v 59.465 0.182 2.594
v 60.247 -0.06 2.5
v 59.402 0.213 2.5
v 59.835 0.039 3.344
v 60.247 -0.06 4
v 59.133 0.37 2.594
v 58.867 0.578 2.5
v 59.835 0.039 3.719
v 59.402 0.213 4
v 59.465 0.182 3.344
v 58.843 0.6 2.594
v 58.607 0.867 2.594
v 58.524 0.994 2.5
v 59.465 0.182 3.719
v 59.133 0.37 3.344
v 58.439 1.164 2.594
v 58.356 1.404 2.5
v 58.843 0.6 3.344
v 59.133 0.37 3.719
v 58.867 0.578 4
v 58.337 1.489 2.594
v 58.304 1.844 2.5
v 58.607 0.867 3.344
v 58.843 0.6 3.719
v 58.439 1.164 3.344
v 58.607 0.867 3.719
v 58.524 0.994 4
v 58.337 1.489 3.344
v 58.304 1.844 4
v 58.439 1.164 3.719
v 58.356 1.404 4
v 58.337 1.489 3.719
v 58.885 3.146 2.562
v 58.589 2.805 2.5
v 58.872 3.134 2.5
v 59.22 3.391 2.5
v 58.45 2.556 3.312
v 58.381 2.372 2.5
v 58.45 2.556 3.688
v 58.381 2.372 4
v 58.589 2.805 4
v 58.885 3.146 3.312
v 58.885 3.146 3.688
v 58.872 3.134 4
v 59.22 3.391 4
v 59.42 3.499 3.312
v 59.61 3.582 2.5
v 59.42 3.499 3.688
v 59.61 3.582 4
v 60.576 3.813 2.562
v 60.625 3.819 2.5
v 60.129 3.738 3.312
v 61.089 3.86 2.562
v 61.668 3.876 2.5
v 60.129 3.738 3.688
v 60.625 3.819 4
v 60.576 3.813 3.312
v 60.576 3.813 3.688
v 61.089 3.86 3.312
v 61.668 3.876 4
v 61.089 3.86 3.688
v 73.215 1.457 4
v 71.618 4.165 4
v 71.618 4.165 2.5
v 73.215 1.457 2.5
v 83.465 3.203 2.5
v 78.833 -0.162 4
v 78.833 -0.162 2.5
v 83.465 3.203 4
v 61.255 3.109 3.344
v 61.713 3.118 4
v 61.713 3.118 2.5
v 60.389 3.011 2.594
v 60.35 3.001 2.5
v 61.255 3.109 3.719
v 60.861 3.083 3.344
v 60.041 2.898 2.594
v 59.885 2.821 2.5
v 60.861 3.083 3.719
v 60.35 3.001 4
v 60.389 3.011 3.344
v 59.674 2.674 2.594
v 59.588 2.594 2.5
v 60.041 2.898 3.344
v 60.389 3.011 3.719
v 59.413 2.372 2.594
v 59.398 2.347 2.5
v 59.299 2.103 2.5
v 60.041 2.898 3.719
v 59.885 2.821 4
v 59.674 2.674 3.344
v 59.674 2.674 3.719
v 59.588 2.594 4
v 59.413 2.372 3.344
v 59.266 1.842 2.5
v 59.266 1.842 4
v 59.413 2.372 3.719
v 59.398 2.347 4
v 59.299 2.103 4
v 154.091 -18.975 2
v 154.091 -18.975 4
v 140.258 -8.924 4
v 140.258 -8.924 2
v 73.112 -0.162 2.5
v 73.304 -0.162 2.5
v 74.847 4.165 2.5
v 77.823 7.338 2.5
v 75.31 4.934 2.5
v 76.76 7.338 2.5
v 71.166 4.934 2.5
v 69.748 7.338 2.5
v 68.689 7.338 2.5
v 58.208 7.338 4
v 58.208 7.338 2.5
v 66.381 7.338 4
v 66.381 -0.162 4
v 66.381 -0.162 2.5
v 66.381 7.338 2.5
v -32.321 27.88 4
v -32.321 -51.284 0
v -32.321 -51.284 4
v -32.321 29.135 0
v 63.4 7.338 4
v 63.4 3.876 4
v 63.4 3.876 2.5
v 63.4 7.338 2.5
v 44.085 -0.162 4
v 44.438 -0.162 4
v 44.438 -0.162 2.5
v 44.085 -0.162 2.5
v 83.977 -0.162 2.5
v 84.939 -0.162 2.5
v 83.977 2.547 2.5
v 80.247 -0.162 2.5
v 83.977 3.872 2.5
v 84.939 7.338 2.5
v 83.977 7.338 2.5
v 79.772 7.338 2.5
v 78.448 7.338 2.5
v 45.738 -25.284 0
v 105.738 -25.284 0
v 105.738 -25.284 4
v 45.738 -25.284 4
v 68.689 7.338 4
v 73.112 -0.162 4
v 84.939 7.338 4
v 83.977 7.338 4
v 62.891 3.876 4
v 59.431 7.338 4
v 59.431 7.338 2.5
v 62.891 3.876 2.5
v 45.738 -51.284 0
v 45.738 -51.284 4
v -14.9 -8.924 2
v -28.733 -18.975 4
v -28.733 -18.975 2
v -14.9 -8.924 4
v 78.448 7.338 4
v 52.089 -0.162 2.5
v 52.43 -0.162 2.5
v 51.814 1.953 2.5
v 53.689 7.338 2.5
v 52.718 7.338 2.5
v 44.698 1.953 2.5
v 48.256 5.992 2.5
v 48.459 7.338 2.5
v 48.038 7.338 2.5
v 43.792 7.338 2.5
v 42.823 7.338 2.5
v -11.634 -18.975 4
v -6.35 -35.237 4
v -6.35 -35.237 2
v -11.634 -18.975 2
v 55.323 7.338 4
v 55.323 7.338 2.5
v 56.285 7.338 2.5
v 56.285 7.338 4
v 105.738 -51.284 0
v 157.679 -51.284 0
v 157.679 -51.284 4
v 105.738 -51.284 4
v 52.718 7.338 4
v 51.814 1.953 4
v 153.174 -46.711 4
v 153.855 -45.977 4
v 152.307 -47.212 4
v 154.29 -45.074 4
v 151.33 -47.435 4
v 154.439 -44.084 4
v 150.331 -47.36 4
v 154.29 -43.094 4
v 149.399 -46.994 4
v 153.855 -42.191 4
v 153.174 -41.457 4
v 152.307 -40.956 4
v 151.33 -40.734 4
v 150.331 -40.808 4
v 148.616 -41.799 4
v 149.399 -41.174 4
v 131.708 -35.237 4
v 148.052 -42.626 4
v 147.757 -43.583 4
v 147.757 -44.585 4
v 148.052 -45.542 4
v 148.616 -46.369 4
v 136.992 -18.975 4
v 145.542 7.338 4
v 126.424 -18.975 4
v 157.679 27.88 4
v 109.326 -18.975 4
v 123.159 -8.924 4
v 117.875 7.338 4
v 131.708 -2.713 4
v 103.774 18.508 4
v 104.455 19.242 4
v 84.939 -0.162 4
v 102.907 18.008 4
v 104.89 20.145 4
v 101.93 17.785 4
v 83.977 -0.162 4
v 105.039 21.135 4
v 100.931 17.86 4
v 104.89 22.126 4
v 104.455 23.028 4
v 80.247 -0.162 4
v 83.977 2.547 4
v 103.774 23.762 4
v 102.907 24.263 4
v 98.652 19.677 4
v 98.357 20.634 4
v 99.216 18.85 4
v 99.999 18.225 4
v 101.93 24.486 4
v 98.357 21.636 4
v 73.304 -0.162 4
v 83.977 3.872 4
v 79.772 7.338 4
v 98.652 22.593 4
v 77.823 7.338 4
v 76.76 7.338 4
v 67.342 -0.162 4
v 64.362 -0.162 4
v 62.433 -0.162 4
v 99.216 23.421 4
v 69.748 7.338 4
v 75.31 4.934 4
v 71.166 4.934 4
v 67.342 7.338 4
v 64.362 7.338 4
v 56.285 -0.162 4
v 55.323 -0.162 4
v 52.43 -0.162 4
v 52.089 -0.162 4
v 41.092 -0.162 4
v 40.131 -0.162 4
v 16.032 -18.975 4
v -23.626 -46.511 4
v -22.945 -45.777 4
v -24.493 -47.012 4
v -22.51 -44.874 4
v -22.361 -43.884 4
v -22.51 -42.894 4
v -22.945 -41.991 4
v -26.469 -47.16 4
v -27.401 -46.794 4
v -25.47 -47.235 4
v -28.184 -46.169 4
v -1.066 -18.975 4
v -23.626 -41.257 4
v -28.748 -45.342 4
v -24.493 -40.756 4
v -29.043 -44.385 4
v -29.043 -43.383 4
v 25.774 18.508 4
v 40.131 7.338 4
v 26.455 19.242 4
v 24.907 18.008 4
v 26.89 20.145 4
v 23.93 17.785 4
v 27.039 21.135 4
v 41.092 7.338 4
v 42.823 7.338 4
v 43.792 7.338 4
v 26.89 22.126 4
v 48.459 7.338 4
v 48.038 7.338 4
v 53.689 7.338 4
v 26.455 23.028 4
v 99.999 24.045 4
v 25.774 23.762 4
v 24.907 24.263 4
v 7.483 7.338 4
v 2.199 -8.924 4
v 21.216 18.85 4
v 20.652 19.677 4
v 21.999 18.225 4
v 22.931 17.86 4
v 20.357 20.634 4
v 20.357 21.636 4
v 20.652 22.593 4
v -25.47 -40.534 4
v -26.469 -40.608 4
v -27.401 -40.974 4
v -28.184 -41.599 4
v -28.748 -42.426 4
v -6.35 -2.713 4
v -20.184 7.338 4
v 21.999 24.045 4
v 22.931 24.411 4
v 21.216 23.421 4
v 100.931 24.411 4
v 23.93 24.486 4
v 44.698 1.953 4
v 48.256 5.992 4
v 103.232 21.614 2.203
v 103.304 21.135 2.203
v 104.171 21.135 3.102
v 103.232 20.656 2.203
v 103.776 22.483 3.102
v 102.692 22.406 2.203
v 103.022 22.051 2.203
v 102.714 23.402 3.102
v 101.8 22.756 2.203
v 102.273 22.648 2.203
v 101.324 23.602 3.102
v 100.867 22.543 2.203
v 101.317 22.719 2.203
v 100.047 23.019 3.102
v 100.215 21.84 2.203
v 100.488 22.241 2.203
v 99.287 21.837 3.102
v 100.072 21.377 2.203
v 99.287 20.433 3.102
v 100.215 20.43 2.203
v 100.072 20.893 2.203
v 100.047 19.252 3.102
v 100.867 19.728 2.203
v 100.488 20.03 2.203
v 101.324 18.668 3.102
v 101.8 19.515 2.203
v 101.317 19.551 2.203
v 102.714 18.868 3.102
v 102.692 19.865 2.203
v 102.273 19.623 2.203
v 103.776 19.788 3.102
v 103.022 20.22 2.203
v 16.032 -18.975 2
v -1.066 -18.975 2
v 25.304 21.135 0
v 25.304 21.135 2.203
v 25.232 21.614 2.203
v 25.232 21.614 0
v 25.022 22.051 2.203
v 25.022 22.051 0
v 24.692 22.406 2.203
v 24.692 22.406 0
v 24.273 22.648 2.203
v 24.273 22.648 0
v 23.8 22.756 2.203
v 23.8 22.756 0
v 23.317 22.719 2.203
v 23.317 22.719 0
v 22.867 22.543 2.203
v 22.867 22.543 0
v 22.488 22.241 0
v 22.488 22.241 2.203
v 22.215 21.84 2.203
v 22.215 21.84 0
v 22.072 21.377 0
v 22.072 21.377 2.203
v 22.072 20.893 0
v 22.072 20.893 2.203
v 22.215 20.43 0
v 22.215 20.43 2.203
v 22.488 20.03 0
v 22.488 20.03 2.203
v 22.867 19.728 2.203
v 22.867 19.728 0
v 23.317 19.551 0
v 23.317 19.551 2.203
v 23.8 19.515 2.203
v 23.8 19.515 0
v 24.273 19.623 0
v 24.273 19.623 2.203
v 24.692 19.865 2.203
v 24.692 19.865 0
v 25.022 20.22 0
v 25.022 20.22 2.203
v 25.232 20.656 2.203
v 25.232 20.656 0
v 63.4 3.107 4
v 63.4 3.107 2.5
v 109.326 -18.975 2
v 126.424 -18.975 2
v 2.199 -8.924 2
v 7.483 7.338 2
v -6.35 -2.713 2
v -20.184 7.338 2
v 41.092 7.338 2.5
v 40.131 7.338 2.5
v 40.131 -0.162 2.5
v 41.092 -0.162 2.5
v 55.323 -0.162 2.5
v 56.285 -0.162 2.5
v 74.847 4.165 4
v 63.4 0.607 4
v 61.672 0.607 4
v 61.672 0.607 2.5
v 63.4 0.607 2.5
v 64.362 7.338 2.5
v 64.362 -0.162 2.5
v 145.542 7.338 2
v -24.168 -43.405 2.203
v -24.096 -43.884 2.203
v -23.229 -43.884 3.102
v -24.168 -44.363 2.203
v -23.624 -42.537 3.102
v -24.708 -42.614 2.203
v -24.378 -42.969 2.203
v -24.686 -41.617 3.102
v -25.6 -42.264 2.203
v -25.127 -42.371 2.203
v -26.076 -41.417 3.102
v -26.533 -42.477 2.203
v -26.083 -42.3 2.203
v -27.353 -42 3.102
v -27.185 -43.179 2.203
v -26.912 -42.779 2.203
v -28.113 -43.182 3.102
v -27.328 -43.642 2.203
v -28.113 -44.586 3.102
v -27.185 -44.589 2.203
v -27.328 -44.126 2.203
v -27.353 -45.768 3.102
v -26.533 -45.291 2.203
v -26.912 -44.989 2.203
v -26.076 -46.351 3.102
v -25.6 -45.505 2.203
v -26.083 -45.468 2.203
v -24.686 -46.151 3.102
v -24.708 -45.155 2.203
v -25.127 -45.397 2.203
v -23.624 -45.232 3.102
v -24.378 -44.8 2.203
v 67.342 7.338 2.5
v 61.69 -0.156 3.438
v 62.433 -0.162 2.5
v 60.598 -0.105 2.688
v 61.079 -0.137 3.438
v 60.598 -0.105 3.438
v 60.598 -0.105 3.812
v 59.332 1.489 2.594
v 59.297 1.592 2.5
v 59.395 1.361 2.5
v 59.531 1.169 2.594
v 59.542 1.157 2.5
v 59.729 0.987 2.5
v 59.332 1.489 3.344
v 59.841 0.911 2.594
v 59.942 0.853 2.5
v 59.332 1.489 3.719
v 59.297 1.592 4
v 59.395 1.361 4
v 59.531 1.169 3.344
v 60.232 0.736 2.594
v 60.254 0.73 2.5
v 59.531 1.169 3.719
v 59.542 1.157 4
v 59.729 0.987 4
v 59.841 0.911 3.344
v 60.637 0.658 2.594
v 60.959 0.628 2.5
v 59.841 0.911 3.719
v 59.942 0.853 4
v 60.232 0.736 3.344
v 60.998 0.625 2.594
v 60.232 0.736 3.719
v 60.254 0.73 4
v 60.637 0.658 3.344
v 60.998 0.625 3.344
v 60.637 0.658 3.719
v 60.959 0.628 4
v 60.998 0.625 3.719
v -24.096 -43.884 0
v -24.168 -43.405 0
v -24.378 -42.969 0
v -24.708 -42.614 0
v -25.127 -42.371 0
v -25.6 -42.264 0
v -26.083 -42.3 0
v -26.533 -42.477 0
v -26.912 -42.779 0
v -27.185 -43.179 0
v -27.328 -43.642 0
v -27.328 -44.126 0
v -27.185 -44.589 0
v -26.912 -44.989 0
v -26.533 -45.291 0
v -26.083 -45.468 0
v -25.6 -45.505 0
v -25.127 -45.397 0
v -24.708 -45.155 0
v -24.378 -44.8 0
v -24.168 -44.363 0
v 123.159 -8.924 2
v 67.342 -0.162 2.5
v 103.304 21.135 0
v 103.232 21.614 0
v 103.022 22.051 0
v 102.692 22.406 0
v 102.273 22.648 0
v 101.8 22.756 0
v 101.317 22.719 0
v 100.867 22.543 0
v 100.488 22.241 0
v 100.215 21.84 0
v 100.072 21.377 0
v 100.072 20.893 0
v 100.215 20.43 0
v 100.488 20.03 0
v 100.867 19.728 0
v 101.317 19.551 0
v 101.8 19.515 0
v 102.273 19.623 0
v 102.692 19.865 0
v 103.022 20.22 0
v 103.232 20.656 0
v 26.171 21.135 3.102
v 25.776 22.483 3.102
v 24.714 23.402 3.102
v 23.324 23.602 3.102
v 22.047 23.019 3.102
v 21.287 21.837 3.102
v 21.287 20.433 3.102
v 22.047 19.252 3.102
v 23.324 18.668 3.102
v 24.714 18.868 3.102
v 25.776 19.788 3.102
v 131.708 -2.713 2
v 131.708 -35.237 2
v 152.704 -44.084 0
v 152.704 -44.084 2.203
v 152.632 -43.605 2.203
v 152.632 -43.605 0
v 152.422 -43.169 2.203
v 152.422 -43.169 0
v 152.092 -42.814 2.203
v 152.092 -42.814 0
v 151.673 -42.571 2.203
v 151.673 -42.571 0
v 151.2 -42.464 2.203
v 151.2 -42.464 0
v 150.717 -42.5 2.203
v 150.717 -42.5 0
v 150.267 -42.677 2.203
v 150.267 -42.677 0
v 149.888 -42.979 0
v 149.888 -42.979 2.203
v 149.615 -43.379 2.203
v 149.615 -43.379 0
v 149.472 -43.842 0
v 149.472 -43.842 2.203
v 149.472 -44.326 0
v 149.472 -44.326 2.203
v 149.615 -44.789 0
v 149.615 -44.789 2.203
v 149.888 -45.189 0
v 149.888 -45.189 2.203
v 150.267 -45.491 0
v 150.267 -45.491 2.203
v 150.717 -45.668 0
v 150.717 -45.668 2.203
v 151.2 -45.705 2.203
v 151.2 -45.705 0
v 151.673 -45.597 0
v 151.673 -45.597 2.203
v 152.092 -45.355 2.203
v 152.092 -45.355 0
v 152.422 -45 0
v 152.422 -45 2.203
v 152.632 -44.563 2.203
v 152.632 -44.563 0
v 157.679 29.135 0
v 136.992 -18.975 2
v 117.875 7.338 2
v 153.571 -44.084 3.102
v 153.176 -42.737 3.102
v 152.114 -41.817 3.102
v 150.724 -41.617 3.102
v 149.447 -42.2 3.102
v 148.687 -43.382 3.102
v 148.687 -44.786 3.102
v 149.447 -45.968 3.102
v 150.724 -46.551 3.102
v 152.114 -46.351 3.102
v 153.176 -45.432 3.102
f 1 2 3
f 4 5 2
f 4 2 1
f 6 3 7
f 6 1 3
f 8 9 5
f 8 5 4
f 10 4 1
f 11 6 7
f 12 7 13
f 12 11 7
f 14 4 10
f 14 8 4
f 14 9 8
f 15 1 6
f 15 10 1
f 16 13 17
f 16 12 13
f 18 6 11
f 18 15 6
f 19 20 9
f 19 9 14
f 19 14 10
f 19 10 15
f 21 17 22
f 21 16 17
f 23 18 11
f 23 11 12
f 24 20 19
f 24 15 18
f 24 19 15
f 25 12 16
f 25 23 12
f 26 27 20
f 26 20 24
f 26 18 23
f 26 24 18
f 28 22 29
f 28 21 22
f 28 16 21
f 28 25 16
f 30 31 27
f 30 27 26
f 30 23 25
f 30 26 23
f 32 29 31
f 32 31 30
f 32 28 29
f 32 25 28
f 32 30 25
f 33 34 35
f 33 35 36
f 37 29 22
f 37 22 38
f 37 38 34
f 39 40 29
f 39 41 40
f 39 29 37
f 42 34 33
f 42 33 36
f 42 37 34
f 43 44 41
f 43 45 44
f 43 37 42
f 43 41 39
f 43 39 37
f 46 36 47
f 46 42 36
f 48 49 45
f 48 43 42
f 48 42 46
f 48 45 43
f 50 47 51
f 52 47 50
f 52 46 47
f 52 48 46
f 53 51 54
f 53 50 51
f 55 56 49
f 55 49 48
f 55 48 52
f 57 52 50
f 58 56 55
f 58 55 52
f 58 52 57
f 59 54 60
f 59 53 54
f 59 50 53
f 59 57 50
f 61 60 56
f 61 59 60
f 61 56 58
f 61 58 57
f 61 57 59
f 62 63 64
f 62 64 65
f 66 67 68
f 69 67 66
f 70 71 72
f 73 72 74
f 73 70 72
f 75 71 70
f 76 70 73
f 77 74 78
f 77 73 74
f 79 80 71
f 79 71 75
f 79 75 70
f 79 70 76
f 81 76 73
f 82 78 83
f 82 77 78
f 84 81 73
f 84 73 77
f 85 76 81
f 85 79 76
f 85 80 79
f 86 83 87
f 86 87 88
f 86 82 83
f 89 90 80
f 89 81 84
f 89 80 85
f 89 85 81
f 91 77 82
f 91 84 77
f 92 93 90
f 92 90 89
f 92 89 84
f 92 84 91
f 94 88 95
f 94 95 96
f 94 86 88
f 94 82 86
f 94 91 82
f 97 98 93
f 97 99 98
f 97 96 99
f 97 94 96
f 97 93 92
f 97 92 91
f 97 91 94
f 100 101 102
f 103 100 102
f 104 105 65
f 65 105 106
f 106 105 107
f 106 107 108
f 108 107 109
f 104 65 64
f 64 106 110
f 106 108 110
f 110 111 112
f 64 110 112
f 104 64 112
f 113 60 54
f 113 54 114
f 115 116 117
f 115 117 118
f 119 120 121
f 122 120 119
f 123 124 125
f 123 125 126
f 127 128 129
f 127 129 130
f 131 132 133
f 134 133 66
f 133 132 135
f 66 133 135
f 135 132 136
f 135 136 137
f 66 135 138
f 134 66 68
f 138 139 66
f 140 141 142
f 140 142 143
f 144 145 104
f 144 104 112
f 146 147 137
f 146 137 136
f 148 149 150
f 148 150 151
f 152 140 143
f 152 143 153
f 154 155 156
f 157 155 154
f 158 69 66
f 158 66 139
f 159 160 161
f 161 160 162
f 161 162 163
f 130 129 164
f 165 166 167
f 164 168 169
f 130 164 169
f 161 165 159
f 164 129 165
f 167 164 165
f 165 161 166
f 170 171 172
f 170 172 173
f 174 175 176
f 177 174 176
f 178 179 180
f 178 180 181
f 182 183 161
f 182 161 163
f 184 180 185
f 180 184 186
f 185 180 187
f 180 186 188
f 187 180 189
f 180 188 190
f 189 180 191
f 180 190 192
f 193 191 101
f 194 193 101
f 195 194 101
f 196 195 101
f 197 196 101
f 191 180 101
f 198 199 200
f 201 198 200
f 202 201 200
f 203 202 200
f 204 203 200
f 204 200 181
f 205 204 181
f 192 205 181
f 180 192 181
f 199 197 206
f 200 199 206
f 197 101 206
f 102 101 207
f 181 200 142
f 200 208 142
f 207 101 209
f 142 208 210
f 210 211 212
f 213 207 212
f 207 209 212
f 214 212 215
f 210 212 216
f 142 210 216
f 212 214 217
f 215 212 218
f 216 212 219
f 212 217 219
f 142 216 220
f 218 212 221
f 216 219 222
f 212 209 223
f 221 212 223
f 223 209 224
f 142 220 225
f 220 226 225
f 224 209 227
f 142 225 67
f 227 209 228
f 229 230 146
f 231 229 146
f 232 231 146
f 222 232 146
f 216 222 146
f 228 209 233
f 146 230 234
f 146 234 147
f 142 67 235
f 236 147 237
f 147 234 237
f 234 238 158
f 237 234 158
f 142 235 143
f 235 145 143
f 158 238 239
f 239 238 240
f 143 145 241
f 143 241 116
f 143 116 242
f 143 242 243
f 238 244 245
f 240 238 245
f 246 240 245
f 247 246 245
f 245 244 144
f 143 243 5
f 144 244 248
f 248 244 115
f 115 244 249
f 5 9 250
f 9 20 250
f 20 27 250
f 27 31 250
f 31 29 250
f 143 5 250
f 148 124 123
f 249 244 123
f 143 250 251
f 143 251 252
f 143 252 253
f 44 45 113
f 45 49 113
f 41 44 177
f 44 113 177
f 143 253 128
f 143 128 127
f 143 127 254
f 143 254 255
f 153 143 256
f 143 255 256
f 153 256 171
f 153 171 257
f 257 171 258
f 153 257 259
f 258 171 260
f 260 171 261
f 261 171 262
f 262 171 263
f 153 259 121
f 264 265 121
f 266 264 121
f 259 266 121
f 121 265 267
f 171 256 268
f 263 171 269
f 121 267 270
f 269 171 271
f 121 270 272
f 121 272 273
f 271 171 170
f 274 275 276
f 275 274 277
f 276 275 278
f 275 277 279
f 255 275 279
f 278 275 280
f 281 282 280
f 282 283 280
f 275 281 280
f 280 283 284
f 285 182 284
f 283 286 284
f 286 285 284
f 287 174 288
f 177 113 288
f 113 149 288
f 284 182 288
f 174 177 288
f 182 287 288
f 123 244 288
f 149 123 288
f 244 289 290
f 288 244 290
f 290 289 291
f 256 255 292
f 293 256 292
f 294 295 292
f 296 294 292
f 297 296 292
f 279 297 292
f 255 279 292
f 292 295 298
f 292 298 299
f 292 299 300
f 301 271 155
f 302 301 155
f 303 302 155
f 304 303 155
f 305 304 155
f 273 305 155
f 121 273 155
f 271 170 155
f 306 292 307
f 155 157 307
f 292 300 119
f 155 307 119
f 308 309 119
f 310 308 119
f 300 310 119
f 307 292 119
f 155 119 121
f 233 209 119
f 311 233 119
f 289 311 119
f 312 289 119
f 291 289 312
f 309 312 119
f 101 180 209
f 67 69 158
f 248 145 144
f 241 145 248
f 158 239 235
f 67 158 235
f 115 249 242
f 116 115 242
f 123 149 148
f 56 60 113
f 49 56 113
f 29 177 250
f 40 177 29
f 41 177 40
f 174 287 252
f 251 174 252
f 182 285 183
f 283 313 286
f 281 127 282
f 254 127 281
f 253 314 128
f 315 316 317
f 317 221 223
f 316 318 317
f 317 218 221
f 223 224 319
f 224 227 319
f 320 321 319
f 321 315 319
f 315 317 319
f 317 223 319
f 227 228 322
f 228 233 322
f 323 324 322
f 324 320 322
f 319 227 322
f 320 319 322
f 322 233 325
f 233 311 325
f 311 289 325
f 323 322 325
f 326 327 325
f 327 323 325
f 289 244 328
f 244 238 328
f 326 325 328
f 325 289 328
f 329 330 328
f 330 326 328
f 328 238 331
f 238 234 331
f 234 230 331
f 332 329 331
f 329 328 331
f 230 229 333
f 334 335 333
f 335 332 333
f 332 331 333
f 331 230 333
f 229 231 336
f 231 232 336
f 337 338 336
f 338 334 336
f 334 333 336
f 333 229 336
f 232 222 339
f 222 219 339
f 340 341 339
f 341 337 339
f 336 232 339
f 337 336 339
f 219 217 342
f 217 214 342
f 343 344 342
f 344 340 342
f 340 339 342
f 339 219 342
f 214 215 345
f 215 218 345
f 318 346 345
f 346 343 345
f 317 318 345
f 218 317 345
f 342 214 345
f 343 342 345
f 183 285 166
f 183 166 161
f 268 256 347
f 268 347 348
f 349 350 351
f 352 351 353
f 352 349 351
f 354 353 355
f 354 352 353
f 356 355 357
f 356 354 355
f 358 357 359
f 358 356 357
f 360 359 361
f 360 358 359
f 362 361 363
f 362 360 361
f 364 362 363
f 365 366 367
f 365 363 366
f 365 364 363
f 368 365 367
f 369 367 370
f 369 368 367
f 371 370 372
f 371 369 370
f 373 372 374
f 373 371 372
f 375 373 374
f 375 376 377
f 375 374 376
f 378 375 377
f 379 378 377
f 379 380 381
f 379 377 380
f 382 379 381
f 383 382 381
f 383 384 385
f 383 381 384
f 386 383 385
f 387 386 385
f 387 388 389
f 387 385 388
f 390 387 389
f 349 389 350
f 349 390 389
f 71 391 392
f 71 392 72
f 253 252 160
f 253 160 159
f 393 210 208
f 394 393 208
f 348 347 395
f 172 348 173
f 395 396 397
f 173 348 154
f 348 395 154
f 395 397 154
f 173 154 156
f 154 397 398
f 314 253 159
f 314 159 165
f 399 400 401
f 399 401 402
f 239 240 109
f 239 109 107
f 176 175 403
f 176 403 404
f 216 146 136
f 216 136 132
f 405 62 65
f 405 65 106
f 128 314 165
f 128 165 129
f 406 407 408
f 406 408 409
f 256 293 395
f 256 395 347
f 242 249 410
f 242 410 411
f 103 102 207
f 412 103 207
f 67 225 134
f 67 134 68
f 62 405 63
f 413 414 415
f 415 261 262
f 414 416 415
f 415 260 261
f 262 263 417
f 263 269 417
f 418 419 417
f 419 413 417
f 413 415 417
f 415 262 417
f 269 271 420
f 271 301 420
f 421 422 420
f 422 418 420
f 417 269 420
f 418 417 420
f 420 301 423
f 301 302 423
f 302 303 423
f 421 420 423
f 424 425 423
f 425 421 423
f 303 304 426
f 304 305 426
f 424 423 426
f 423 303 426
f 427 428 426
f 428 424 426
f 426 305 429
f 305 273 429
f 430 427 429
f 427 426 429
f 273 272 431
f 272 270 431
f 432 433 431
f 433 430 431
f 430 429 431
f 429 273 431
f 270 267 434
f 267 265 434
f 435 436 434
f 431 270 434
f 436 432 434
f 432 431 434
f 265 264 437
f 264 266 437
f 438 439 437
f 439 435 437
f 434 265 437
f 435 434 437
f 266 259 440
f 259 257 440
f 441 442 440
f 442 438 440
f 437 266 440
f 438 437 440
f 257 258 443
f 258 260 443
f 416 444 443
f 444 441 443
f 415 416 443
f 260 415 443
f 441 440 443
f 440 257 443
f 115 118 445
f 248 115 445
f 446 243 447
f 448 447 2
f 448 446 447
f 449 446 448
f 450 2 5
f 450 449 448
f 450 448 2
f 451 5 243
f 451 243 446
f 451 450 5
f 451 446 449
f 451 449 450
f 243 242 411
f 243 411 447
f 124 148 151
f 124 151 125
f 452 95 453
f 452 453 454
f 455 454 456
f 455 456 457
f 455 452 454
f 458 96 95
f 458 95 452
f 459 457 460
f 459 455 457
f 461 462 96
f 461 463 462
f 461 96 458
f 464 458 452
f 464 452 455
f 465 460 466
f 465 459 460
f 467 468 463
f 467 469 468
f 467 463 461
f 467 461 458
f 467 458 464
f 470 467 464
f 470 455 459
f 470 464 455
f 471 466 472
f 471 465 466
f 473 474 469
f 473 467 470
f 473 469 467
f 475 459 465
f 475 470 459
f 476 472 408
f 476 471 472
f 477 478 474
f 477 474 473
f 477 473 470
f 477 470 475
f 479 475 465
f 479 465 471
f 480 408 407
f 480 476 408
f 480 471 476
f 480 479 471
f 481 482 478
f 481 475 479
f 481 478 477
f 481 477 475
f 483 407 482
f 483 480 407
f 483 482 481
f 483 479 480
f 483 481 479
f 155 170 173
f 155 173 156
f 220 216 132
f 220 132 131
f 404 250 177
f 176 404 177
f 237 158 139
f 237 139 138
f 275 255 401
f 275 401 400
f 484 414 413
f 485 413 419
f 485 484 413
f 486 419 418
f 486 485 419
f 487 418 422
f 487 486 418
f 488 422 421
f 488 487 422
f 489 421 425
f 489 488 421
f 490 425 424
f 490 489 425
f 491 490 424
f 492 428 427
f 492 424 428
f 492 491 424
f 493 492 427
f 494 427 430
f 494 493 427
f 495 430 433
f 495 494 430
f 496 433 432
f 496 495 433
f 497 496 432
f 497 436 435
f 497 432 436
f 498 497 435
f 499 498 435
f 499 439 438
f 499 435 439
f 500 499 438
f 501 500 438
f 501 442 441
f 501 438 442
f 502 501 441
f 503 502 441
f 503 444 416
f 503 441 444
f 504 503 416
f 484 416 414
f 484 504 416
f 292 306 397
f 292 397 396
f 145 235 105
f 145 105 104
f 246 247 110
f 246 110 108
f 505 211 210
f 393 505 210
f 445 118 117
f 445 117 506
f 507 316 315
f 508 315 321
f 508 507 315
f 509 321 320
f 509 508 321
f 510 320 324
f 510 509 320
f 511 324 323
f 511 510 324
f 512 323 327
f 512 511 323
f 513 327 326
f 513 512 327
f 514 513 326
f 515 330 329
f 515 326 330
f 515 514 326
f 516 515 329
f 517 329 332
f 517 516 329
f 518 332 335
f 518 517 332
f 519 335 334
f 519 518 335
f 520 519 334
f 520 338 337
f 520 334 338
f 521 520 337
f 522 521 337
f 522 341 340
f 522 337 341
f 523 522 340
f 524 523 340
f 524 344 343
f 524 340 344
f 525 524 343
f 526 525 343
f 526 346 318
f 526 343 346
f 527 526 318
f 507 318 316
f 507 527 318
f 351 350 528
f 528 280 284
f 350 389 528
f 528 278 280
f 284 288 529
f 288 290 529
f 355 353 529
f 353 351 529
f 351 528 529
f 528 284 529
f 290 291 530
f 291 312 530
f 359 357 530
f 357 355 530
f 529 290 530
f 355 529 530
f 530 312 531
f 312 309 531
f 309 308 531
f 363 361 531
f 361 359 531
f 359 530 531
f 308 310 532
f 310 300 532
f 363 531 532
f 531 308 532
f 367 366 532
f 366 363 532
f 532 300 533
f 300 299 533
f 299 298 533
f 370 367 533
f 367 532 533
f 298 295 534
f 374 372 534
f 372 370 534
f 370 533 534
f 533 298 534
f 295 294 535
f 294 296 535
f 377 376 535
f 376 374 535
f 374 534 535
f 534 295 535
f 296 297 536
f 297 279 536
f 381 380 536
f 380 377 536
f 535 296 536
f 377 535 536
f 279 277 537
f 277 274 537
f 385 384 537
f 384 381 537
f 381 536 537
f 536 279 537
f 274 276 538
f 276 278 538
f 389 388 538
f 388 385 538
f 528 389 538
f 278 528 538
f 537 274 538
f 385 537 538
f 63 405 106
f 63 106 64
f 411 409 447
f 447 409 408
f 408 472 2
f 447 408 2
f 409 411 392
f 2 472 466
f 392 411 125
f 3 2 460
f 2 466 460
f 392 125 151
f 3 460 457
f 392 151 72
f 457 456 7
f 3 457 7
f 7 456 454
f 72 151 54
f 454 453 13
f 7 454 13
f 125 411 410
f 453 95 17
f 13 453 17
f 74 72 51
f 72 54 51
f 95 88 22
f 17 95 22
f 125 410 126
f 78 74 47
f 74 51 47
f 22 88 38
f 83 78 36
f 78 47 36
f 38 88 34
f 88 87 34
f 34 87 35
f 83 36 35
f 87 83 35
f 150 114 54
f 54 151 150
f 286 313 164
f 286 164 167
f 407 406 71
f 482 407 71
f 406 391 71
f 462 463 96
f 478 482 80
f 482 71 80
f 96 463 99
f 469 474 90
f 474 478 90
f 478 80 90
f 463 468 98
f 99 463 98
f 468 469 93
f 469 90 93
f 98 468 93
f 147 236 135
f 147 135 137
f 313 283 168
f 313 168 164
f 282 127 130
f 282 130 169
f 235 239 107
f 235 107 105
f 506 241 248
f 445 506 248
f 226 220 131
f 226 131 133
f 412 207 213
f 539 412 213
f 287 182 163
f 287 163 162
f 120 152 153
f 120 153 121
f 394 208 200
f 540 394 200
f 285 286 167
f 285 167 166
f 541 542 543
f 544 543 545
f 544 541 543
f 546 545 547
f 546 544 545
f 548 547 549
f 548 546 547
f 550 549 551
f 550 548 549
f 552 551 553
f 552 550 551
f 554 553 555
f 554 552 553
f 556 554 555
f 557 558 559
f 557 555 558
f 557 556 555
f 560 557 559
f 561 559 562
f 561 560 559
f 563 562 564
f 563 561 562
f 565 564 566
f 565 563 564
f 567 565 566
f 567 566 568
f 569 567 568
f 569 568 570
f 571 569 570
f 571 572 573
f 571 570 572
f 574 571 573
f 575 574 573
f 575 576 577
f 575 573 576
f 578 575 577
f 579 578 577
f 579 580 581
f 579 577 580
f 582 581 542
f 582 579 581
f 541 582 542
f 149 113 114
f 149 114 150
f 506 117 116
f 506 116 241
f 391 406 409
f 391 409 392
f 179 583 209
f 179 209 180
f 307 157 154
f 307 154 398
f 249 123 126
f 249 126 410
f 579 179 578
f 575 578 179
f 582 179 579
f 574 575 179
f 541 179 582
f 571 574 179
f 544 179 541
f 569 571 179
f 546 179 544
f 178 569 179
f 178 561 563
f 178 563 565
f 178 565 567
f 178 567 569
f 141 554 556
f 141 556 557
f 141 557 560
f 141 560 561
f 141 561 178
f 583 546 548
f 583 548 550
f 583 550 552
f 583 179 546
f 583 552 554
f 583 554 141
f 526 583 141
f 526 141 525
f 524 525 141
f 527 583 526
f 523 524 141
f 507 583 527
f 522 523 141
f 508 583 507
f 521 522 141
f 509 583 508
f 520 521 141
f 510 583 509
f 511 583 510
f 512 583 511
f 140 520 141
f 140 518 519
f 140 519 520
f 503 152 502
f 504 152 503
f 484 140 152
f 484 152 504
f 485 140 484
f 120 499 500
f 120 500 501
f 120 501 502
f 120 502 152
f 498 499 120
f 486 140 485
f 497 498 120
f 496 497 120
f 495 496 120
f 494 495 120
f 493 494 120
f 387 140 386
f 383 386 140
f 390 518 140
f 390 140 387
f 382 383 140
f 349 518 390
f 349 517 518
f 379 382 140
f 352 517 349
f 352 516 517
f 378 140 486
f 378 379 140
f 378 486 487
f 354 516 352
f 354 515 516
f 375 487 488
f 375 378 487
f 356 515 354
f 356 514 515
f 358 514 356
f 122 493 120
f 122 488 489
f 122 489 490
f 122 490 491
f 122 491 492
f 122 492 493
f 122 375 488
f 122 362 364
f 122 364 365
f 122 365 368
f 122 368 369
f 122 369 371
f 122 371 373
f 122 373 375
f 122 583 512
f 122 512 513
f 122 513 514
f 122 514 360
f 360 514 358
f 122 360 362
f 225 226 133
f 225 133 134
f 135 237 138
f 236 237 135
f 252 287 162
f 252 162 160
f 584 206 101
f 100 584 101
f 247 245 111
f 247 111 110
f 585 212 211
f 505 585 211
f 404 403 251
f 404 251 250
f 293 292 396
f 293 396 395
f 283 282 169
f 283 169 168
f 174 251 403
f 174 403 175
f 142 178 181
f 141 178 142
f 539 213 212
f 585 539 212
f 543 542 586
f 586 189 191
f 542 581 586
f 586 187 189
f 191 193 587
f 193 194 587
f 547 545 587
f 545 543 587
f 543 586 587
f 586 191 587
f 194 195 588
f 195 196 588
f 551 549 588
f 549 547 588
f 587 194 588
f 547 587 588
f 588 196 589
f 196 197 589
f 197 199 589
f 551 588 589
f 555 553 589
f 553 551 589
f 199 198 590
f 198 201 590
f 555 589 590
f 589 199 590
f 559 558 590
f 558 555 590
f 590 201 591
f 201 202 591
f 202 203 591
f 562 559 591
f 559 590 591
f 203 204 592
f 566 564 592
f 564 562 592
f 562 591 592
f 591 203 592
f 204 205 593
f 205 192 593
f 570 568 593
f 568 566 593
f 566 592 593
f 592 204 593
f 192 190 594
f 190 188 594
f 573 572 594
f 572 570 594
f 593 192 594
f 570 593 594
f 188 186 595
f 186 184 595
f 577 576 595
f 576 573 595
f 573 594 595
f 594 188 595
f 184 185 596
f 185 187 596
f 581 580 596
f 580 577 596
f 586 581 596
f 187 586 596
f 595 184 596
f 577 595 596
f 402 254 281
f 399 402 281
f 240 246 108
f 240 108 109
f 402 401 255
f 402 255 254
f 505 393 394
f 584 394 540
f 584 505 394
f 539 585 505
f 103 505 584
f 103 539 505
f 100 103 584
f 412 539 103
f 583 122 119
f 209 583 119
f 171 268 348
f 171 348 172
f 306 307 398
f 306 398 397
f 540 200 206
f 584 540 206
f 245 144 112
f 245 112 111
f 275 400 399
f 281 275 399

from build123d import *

# Parameters (mm, degrees)
CROQUIS1_R                      = 1.625
SALIENTE_EXTRUIR1_DEPTH         = 4
CORTAR_EXTRUIR1_START           = -190
CORTAR_EXTRUIR1_DEPTH           = 190
CROQUIS4_R                      = 3.35997123
CORTAR_EXTRUIR2_DEPTH           = 1.8
CORTAR_EXTRUIR2_DRAFT           = -44
CORTAR_EXTRUIR2_PROFILE_2_DEPTH = 1.8
CORTAR_EXTRUIR2_PROFILE_2_DRAFT = -44
CORTAR_EXTRUIR2_PROFILE_3_DEPTH = 1.8
CORTAR_EXTRUIR2_PROFILE_3_DRAFT = -44
CORTAR_EXTRUIR2_PROFILE_4_DEPTH = 1.8
CORTAR_EXTRUIR2_PROFILE_4_DRAFT = -44
CORTAR_EXTRUIR3_DEPTH           = 2
CROQUIS9_W                      = 0.961538462
CROQUIS9_H                      = 7.5
CORTAR_EXTRUIR5_DEPTH           = 1.5


with BuildPart() as part:
    # Croquis1 → Saliente-Extruir1 (new body)
    with BuildSketch(Plane.XY):
        Polygon((-32.320991683, -51.284123552), (-32.320991683, 29.135238548), (157.679008317, 29.135238548), (157.679008317, -51.284123552), (105.737585684, -51.284123552), (105.737585684, -25.284123552), (45.737585684, -25.284123552), (45.737585684, -51.284123552), align=None)
        with Locations((23.679008317, 21.135238548)):
            Circle(CROQUIS1_R, mode=Mode.SUBTRACT)
        with Locations((101.679008317, 21.135238548)):
            Circle(CROQUIS1_R, mode=Mode.SUBTRACT)
        with Locations((-25.720991683, -43.884123552)):
            Circle(CROQUIS1_R, mode=Mode.SUBTRACT)
        with Locations((151.079008317, -44.084123552)):
            Circle(CROQUIS1_R, mode=Mode.SUBTRACT)
    extrude(amount=SALIENTE_EXTRUIR1_DEPTH)

    # Croquis3 → Cortar-Extruir1 (cut)
    with BuildSketch(Plane(origin=(157.679008317, 0, 0), x_dir=(0, 0, -1), z_dir=(1, 0, 0)).offset(CORTAR_EXTRUIR1_START)):
        Polygon((-4, 29.135238548), (0, 29.135238548), (-4, 27.880003721), align=None)
    extrude(amount=CORTAR_EXTRUIR1_DEPTH, mode=Mode.SUBTRACT)


with BuildPart() as cortar_extruir2_tool:
    # Croquis4 → Cortar-Extruir2 (with draft: the straight prism first)
    with BuildSketch(Plane.XY.offset(4)):
        with Locations((23.679008317, 21.135238548)):
            Circle(CROQUIS4_R)
    extrude(amount=-CORTAR_EXTRUIR2_DEPTH)
    # Cortar-Extruir2: the draft: its side faces are tilted about the plane it starts from
    cortar_extruir2_sides = [cortar_extruir2_tool.faces().sort_by_distance(p)[0] for p in [
        (20.319037087, 21.135238548, 3.1),
    ]]
    draft(cortar_extruir2_sides, Plane.XY.offset(4), CORTAR_EXTRUIR2_DRAFT)


with BuildPart() as part_1:
    add(part.part)

    # Cortar-Extruir2: cut by cortar_extruir2_tool
    add(cortar_extruir2_tool.part, mode=Mode.SUBTRACT)


with BuildPart() as cortar_extruir2_profile_2_tool:
    # Croquis4 → Cortar-Extruir2 profile 2 (with draft: the straight prism first)
    with BuildSketch(Plane.XY.offset(4)):
        with Locations((101.679008317, 21.135238548)):
            Circle(CROQUIS4_R)
    extrude(amount=-CORTAR_EXTRUIR2_PROFILE_2_DEPTH)
    # Cortar-Extruir2 profile 2: the draft: its side faces are tilted about the plane it starts from
    cortar_extruir2_profile_2_sides = [cortar_extruir2_profile_2_tool.faces().sort_by_distance(p)[0] for p in [
        (98.319037087, 21.135238548, 3.1),
    ]]
    draft(cortar_extruir2_profile_2_sides, Plane.XY.offset(4), CORTAR_EXTRUIR2_PROFILE_2_DRAFT)


with BuildPart() as part_2:
    add(part_1.part)

    # Cortar-Extruir2 profile 2: cut by cortar_extruir2_profile_2_tool
    add(cortar_extruir2_profile_2_tool.part, mode=Mode.SUBTRACT)


with BuildPart() as cortar_extruir2_profile_3_tool:
    # Croquis4 → Cortar-Extruir2 profile 3 (with draft: the straight prism first)
    with BuildSketch(Plane.XY.offset(4)):
        with Locations((-25.720991683, -43.884123552)):
            Circle(CROQUIS4_R)
    extrude(amount=-CORTAR_EXTRUIR2_PROFILE_3_DEPTH)
    # Cortar-Extruir2 profile 3: the draft: its side faces are tilted about the plane it starts from
    cortar_extruir2_profile_3_sides = [cortar_extruir2_profile_3_tool.faces().sort_by_distance(p)[0] for p in [
        (-29.080962913, -43.884123552, 3.1),
    ]]
    draft(cortar_extruir2_profile_3_sides, Plane.XY.offset(4), CORTAR_EXTRUIR2_PROFILE_3_DRAFT)


with BuildPart() as part_3:
    add(part_2.part)

    # Cortar-Extruir2 profile 3: cut by cortar_extruir2_profile_3_tool
    add(cortar_extruir2_profile_3_tool.part, mode=Mode.SUBTRACT)


with BuildPart() as cortar_extruir2_profile_4_tool:
    # Croquis4 → Cortar-Extruir2 profile 4 (with draft: the straight prism first)
    with BuildSketch(Plane.XY.offset(4)):
        with Locations((151.079008317, -44.084123552)):
            Circle(CROQUIS4_R)
    extrude(amount=-CORTAR_EXTRUIR2_PROFILE_4_DEPTH)
    # Cortar-Extruir2 profile 4: the draft: its side faces are tilted about the plane it starts from
    cortar_extruir2_profile_4_sides = [cortar_extruir2_profile_4_tool.faces().sort_by_distance(p)[0] for p in [
        (147.719037087, -44.084123552, 3.1),
    ]]
    draft(cortar_extruir2_profile_4_sides, Plane.XY.offset(4), CORTAR_EXTRUIR2_PROFILE_4_DRAFT)


with BuildPart() as part_4:
    add(part_3.part)

    # Cortar-Extruir2 profile 4: cut by cortar_extruir2_profile_4_tool
    add(cortar_extruir2_profile_4_tool.part, mode=Mode.SUBTRACT)

    # Croquis6 → Cortar-Extruir3 (cut)
    with BuildSketch(Plane.XY.offset(4)):
        Polygon((16.032465101, -18.974654774), (-1.066430914, -18.974654774), (-6.350280368, -35.236671251), (-11.634129822, -18.974654774), (-28.733025837, -18.974654774), (-14.899728375, -8.924175866), (-20.183577829, 7.337840611), (-6.350280368, -2.712638297), (7.483017094, 7.337840611), (2.19916764, -8.924175866), align=None)
        Polygon((109.325551533, -18.974654774), (126.424447548, -18.974654774), (131.708297002, -35.236671251), (136.992146456, -18.974654774), (154.091042471, -18.974654774), (140.25774501, -8.924175866), (145.541594464, 7.337840611), (131.708297002, -2.712638297), (117.874999541, 7.337840611), (123.158848995, -8.924175866), align=None)
    extrude(amount=-CORTAR_EXTRUIR3_DEPTH, mode=Mode.SUBTRACT)

    # Croquis9 → Cortar-Extruir5 (cut)
    # profile 1 of 7: a face of its own
    with BuildSketch(Plane.XY.offset(4)):
        Polygon((84.938623702, -0.162159389), (83.97708524, -0.162159389), (83.97708524, 2.546674746), (80.24661649, -0.162159389), (78.832854471, -0.162159389), (83.464765529, 3.203225226), (78.448239086, 7.337840611), (79.771856875, 7.337840611), (83.97708524, 3.871794938), (83.97708524, 7.337840611), (84.938623702, 7.337840611), align=None)
    # profile 2 of 7: a face of its own
    with BuildSketch(Plane.XY.offset(4)):
        Polygon((73.111700625, -0.162159389), (68.688623702, 7.337840611), (69.747818413, 7.337840611), (71.166087644, 4.933994457), (75.309717452, 4.933994457), (76.759537163, 7.337840611), (77.823239086, 7.337840611), (73.304008317, -0.162159389), align=None)
        Polygon((73.21536649, 1.457431957), (74.846977067, 4.164763688), (71.618311202, 4.164763688), align=None, mode=Mode.SUBTRACT)
    # profile 3 of 7: a face of its own
    with BuildSketch(Plane.XY.offset(4)):
        with Locations((66.861700625, 3.587840611)):
            Rectangle(CROQUIS9_W, CROQUIS9_H)
    # profile 4 of 7: a face of its own
    with BuildSketch(Plane.XY.offset(4)):
        with BuildLine():
            Line((64.361700625, -0.162159389), (62.432614086, -0.162159389))
            add(Edge.make_bspline(
                [(62.432614086, -0.162159389), (62.303407857, -0.161829936), (62.056004322, -0.161199101), (61.701380518, -0.157593434), (61.379408986, -0.147395372), (61.089802811, -0.138594846), (60.832957985, -0.122524062), (60.608382947, -0.107262614), (60.416359573, -0.087004293), (60.299642276, -0.06843303), (60.24661649, -0.059995928)],
                knots=[0, 0, 0, 0, 1.415751681, 2.71087525, 3.885633551, 4.945392006, 5.885335126, 6.705178082, 7.411750013, 8, 8, 8, 8], degree=3))
            add(Edge.make_bspline(
                [(60.24661649, -0.059995928), (60.176287708, -0.046434609), (60.037576928, -0.019687366), (59.836939759, 0.036257843), (59.646354736, 0.102761484), (59.465191207, 0.179124214), (59.294103688, 0.267862518), (59.132735961, 0.367086444), (58.982105619, 0.477181944), (58.841971811, 0.596786711), (58.716597542, 0.726930123), (58.605911754, 0.864303479), (58.511163617, 1.009066491), (58.437601574, 1.163087556), (58.375263981, 1.322066158), (58.333771964, 1.489710459), (58.309818392, 1.664567276), (58.305961545, 1.783379506), (58.304008317, 1.843549746)],
                knots=[0, 0, 0, 0, 1.157691968, 2.283337632, 3.364020569, 4.419814557, 5.459210511, 6.477190408, 7.479723838, 8.473058916, 9.452300592, 10.396950777, 11.322316779, 12.24213949, 13.151964026, 14.078922895, 15.027106307, 16, 16, 16, 16], degree=3))
            add(Edge.make_bspline(
                [(58.304008317, 1.843549746), (58.305091786, 1.894193695), (58.307233563, 1.994305563), (58.326423676, 2.141861151), (58.353980579, 2.284876692), (58.39549308, 2.422930299), (58.44745429, 2.556502857), (58.513219778, 2.685284656), (58.589509979, 2.809405247), (58.676822774, 2.929058118), (58.776602841, 3.04093505), (58.884566714, 3.148428384), (59.003880288, 3.24768771), (59.133254395, 3.339146066), (59.272547378, 3.423510414), (59.421274842, 3.50192944), (59.580656173, 3.571958158), (59.750424189, 3.636018975), (59.934268605, 3.69139676), (60.133100327, 3.741243648), (60.349126643, 3.780614055), (60.580514781, 3.815583328), (60.829148914, 3.842258394), (61.094233729, 3.861356634), (61.375810546, 3.873582923), (61.568718995, 3.875378875), (61.667890529, 3.876302149)],
                knots=[0, 0, 0, 0, 0.82629536, 1.63340285, 2.425382263, 3.201336329, 3.983124717, 4.761829792, 5.558184815, 6.35935043, 7.176046838, 8.002665633, 8.844186878, 9.706107795, 10.586553567, 11.500699361, 12.448580803, 13.426410186, 14.460764388, 15.580971395, 16.77061285, 18.043484787, 19.400318222, 20.851143476, 22.381216936, 24, 24, 24, 24], degree=3))
            Line((61.667890529, 3.876302149), (58.207854471, 7.337840611))
            Line((58.207854471, 7.337840611), (59.430811202, 7.337840611))
            Line((59.430811202, 7.337840611), (62.890847259, 3.876302149))
            Line((62.890847259, 3.876302149), (63.400162163, 3.876302149))
            Line((63.400162163, 3.876302149), (63.400162163, 7.337840611))
            Line((63.400162163, 7.337840611), (64.361700625, 7.337840611))
            Line((64.361700625, 7.337840611), (64.361700625, -0.162159389))
        make_face()
        with BuildLine():
            Line((63.400162163, 0.60707138), (63.400162163, 3.10707138))
            Line((63.400162163, 3.10707138), (61.712962644, 3.117588207))
            add(Edge.make_bspline(
                [(61.712962644, 3.117588207), (61.6338262, 3.117624593), (61.48102171, 3.11769485), (61.260170178, 3.109105998), (61.055229731, 3.099416115), (60.865838556, 3.084387818), (60.692378793, 3.065434605), (60.534983254, 3.041372826), (60.393457337, 3.013276714), (60.228708832, 2.970150308), (60.04308286, 2.905086825), (59.845073139, 2.802592369), (59.671455393, 2.679607959), (59.526919773, 2.535743204), (59.408781872, 2.378204093), (59.32775206, 2.207226521), (59.274453943, 2.028014983), (59.268539248, 1.904525416), (59.265546779, 1.842047342)],
                knots=[0, 0, 0, 0, 1.231241804, 2.377403736, 3.438588451, 4.423532574, 5.333122879, 6.153078988, 6.900388758, 7.57703744, 8.802049324, 9.952204265, 11.035615897, 12.099087035, 13.113730954, 14.082638441, 15.029933775, 16, 16, 16, 16], degree=3))
            add(Edge.make_bspline(
                [(59.265546779, 1.842047342), (59.268716736, 1.78162656), (59.275033974, 1.661217199), (59.326660493, 1.485205192), (59.413536844, 1.319765548), (59.52862314, 1.163619228), (59.673346138, 1.024962204), (59.840039394, 0.905484395), (60.027181277, 0.807486158), (60.199202974, 0.742600317), (60.354080103, 0.704099078), (60.489215667, 0.676455153), (60.642999865, 0.656896215), (60.81430402, 0.638812614), (61.003643568, 0.623698235), (61.210563803, 0.613598768), (61.435480972, 0.607489486), (61.59126372, 0.607214564), (61.67239774, 0.60707138)],
                knots=[0, 0, 0, 0, 0.958272772, 1.909690835, 2.884192254, 3.91323511, 4.976135083, 6.053102071, 7.159410583, 8.321911079, 8.96225367, 9.69213132, 10.510867191, 11.422434135, 12.427570329, 13.526393913, 14.711708402, 16, 16, 16, 16], degree=3))
            Line((61.67239774, 0.60707138), (63.400162163, 0.60707138))
        make_face(mode=Mode.SUBTRACT)
    # profile 5 of 7: a face of its own
    with BuildSketch(Plane.XY.offset(4)):
        with Locations((55.804008317, 3.587840611)):
            Rectangle(CROQUIS9_W, CROQUIS9_H)
    # profile 6 of 7: a face of its own
    with BuildSketch(Plane.XY.offset(4)):
        Polygon((53.688623702, 7.337840611), (52.429609279, -0.162159389), (52.088563606, -0.162159389), (48.255931394, 5.991686765), (44.438323221, -0.162159389), (44.085258317, -0.162159389), (42.823239086, 7.337840611), (43.792289567, 7.337840611), (44.698239086, 1.953225226), (48.038082836, 7.337840611), (48.458755913, 7.337840611), (51.813623702, 1.953225226), (52.718070817, 7.337840611), align=None)
    # profile 7 of 7: a face of its own
    with BuildSketch(Plane.XY.offset(4)):
        with Locations((40.611700625, 3.587840611)):
            Rectangle(CROQUIS9_W, CROQUIS9_H)
    extrude(amount=-CORTAR_EXTRUIR5_DEPTH, mode=Mode.SUBTRACT)


solid = part_4.part
